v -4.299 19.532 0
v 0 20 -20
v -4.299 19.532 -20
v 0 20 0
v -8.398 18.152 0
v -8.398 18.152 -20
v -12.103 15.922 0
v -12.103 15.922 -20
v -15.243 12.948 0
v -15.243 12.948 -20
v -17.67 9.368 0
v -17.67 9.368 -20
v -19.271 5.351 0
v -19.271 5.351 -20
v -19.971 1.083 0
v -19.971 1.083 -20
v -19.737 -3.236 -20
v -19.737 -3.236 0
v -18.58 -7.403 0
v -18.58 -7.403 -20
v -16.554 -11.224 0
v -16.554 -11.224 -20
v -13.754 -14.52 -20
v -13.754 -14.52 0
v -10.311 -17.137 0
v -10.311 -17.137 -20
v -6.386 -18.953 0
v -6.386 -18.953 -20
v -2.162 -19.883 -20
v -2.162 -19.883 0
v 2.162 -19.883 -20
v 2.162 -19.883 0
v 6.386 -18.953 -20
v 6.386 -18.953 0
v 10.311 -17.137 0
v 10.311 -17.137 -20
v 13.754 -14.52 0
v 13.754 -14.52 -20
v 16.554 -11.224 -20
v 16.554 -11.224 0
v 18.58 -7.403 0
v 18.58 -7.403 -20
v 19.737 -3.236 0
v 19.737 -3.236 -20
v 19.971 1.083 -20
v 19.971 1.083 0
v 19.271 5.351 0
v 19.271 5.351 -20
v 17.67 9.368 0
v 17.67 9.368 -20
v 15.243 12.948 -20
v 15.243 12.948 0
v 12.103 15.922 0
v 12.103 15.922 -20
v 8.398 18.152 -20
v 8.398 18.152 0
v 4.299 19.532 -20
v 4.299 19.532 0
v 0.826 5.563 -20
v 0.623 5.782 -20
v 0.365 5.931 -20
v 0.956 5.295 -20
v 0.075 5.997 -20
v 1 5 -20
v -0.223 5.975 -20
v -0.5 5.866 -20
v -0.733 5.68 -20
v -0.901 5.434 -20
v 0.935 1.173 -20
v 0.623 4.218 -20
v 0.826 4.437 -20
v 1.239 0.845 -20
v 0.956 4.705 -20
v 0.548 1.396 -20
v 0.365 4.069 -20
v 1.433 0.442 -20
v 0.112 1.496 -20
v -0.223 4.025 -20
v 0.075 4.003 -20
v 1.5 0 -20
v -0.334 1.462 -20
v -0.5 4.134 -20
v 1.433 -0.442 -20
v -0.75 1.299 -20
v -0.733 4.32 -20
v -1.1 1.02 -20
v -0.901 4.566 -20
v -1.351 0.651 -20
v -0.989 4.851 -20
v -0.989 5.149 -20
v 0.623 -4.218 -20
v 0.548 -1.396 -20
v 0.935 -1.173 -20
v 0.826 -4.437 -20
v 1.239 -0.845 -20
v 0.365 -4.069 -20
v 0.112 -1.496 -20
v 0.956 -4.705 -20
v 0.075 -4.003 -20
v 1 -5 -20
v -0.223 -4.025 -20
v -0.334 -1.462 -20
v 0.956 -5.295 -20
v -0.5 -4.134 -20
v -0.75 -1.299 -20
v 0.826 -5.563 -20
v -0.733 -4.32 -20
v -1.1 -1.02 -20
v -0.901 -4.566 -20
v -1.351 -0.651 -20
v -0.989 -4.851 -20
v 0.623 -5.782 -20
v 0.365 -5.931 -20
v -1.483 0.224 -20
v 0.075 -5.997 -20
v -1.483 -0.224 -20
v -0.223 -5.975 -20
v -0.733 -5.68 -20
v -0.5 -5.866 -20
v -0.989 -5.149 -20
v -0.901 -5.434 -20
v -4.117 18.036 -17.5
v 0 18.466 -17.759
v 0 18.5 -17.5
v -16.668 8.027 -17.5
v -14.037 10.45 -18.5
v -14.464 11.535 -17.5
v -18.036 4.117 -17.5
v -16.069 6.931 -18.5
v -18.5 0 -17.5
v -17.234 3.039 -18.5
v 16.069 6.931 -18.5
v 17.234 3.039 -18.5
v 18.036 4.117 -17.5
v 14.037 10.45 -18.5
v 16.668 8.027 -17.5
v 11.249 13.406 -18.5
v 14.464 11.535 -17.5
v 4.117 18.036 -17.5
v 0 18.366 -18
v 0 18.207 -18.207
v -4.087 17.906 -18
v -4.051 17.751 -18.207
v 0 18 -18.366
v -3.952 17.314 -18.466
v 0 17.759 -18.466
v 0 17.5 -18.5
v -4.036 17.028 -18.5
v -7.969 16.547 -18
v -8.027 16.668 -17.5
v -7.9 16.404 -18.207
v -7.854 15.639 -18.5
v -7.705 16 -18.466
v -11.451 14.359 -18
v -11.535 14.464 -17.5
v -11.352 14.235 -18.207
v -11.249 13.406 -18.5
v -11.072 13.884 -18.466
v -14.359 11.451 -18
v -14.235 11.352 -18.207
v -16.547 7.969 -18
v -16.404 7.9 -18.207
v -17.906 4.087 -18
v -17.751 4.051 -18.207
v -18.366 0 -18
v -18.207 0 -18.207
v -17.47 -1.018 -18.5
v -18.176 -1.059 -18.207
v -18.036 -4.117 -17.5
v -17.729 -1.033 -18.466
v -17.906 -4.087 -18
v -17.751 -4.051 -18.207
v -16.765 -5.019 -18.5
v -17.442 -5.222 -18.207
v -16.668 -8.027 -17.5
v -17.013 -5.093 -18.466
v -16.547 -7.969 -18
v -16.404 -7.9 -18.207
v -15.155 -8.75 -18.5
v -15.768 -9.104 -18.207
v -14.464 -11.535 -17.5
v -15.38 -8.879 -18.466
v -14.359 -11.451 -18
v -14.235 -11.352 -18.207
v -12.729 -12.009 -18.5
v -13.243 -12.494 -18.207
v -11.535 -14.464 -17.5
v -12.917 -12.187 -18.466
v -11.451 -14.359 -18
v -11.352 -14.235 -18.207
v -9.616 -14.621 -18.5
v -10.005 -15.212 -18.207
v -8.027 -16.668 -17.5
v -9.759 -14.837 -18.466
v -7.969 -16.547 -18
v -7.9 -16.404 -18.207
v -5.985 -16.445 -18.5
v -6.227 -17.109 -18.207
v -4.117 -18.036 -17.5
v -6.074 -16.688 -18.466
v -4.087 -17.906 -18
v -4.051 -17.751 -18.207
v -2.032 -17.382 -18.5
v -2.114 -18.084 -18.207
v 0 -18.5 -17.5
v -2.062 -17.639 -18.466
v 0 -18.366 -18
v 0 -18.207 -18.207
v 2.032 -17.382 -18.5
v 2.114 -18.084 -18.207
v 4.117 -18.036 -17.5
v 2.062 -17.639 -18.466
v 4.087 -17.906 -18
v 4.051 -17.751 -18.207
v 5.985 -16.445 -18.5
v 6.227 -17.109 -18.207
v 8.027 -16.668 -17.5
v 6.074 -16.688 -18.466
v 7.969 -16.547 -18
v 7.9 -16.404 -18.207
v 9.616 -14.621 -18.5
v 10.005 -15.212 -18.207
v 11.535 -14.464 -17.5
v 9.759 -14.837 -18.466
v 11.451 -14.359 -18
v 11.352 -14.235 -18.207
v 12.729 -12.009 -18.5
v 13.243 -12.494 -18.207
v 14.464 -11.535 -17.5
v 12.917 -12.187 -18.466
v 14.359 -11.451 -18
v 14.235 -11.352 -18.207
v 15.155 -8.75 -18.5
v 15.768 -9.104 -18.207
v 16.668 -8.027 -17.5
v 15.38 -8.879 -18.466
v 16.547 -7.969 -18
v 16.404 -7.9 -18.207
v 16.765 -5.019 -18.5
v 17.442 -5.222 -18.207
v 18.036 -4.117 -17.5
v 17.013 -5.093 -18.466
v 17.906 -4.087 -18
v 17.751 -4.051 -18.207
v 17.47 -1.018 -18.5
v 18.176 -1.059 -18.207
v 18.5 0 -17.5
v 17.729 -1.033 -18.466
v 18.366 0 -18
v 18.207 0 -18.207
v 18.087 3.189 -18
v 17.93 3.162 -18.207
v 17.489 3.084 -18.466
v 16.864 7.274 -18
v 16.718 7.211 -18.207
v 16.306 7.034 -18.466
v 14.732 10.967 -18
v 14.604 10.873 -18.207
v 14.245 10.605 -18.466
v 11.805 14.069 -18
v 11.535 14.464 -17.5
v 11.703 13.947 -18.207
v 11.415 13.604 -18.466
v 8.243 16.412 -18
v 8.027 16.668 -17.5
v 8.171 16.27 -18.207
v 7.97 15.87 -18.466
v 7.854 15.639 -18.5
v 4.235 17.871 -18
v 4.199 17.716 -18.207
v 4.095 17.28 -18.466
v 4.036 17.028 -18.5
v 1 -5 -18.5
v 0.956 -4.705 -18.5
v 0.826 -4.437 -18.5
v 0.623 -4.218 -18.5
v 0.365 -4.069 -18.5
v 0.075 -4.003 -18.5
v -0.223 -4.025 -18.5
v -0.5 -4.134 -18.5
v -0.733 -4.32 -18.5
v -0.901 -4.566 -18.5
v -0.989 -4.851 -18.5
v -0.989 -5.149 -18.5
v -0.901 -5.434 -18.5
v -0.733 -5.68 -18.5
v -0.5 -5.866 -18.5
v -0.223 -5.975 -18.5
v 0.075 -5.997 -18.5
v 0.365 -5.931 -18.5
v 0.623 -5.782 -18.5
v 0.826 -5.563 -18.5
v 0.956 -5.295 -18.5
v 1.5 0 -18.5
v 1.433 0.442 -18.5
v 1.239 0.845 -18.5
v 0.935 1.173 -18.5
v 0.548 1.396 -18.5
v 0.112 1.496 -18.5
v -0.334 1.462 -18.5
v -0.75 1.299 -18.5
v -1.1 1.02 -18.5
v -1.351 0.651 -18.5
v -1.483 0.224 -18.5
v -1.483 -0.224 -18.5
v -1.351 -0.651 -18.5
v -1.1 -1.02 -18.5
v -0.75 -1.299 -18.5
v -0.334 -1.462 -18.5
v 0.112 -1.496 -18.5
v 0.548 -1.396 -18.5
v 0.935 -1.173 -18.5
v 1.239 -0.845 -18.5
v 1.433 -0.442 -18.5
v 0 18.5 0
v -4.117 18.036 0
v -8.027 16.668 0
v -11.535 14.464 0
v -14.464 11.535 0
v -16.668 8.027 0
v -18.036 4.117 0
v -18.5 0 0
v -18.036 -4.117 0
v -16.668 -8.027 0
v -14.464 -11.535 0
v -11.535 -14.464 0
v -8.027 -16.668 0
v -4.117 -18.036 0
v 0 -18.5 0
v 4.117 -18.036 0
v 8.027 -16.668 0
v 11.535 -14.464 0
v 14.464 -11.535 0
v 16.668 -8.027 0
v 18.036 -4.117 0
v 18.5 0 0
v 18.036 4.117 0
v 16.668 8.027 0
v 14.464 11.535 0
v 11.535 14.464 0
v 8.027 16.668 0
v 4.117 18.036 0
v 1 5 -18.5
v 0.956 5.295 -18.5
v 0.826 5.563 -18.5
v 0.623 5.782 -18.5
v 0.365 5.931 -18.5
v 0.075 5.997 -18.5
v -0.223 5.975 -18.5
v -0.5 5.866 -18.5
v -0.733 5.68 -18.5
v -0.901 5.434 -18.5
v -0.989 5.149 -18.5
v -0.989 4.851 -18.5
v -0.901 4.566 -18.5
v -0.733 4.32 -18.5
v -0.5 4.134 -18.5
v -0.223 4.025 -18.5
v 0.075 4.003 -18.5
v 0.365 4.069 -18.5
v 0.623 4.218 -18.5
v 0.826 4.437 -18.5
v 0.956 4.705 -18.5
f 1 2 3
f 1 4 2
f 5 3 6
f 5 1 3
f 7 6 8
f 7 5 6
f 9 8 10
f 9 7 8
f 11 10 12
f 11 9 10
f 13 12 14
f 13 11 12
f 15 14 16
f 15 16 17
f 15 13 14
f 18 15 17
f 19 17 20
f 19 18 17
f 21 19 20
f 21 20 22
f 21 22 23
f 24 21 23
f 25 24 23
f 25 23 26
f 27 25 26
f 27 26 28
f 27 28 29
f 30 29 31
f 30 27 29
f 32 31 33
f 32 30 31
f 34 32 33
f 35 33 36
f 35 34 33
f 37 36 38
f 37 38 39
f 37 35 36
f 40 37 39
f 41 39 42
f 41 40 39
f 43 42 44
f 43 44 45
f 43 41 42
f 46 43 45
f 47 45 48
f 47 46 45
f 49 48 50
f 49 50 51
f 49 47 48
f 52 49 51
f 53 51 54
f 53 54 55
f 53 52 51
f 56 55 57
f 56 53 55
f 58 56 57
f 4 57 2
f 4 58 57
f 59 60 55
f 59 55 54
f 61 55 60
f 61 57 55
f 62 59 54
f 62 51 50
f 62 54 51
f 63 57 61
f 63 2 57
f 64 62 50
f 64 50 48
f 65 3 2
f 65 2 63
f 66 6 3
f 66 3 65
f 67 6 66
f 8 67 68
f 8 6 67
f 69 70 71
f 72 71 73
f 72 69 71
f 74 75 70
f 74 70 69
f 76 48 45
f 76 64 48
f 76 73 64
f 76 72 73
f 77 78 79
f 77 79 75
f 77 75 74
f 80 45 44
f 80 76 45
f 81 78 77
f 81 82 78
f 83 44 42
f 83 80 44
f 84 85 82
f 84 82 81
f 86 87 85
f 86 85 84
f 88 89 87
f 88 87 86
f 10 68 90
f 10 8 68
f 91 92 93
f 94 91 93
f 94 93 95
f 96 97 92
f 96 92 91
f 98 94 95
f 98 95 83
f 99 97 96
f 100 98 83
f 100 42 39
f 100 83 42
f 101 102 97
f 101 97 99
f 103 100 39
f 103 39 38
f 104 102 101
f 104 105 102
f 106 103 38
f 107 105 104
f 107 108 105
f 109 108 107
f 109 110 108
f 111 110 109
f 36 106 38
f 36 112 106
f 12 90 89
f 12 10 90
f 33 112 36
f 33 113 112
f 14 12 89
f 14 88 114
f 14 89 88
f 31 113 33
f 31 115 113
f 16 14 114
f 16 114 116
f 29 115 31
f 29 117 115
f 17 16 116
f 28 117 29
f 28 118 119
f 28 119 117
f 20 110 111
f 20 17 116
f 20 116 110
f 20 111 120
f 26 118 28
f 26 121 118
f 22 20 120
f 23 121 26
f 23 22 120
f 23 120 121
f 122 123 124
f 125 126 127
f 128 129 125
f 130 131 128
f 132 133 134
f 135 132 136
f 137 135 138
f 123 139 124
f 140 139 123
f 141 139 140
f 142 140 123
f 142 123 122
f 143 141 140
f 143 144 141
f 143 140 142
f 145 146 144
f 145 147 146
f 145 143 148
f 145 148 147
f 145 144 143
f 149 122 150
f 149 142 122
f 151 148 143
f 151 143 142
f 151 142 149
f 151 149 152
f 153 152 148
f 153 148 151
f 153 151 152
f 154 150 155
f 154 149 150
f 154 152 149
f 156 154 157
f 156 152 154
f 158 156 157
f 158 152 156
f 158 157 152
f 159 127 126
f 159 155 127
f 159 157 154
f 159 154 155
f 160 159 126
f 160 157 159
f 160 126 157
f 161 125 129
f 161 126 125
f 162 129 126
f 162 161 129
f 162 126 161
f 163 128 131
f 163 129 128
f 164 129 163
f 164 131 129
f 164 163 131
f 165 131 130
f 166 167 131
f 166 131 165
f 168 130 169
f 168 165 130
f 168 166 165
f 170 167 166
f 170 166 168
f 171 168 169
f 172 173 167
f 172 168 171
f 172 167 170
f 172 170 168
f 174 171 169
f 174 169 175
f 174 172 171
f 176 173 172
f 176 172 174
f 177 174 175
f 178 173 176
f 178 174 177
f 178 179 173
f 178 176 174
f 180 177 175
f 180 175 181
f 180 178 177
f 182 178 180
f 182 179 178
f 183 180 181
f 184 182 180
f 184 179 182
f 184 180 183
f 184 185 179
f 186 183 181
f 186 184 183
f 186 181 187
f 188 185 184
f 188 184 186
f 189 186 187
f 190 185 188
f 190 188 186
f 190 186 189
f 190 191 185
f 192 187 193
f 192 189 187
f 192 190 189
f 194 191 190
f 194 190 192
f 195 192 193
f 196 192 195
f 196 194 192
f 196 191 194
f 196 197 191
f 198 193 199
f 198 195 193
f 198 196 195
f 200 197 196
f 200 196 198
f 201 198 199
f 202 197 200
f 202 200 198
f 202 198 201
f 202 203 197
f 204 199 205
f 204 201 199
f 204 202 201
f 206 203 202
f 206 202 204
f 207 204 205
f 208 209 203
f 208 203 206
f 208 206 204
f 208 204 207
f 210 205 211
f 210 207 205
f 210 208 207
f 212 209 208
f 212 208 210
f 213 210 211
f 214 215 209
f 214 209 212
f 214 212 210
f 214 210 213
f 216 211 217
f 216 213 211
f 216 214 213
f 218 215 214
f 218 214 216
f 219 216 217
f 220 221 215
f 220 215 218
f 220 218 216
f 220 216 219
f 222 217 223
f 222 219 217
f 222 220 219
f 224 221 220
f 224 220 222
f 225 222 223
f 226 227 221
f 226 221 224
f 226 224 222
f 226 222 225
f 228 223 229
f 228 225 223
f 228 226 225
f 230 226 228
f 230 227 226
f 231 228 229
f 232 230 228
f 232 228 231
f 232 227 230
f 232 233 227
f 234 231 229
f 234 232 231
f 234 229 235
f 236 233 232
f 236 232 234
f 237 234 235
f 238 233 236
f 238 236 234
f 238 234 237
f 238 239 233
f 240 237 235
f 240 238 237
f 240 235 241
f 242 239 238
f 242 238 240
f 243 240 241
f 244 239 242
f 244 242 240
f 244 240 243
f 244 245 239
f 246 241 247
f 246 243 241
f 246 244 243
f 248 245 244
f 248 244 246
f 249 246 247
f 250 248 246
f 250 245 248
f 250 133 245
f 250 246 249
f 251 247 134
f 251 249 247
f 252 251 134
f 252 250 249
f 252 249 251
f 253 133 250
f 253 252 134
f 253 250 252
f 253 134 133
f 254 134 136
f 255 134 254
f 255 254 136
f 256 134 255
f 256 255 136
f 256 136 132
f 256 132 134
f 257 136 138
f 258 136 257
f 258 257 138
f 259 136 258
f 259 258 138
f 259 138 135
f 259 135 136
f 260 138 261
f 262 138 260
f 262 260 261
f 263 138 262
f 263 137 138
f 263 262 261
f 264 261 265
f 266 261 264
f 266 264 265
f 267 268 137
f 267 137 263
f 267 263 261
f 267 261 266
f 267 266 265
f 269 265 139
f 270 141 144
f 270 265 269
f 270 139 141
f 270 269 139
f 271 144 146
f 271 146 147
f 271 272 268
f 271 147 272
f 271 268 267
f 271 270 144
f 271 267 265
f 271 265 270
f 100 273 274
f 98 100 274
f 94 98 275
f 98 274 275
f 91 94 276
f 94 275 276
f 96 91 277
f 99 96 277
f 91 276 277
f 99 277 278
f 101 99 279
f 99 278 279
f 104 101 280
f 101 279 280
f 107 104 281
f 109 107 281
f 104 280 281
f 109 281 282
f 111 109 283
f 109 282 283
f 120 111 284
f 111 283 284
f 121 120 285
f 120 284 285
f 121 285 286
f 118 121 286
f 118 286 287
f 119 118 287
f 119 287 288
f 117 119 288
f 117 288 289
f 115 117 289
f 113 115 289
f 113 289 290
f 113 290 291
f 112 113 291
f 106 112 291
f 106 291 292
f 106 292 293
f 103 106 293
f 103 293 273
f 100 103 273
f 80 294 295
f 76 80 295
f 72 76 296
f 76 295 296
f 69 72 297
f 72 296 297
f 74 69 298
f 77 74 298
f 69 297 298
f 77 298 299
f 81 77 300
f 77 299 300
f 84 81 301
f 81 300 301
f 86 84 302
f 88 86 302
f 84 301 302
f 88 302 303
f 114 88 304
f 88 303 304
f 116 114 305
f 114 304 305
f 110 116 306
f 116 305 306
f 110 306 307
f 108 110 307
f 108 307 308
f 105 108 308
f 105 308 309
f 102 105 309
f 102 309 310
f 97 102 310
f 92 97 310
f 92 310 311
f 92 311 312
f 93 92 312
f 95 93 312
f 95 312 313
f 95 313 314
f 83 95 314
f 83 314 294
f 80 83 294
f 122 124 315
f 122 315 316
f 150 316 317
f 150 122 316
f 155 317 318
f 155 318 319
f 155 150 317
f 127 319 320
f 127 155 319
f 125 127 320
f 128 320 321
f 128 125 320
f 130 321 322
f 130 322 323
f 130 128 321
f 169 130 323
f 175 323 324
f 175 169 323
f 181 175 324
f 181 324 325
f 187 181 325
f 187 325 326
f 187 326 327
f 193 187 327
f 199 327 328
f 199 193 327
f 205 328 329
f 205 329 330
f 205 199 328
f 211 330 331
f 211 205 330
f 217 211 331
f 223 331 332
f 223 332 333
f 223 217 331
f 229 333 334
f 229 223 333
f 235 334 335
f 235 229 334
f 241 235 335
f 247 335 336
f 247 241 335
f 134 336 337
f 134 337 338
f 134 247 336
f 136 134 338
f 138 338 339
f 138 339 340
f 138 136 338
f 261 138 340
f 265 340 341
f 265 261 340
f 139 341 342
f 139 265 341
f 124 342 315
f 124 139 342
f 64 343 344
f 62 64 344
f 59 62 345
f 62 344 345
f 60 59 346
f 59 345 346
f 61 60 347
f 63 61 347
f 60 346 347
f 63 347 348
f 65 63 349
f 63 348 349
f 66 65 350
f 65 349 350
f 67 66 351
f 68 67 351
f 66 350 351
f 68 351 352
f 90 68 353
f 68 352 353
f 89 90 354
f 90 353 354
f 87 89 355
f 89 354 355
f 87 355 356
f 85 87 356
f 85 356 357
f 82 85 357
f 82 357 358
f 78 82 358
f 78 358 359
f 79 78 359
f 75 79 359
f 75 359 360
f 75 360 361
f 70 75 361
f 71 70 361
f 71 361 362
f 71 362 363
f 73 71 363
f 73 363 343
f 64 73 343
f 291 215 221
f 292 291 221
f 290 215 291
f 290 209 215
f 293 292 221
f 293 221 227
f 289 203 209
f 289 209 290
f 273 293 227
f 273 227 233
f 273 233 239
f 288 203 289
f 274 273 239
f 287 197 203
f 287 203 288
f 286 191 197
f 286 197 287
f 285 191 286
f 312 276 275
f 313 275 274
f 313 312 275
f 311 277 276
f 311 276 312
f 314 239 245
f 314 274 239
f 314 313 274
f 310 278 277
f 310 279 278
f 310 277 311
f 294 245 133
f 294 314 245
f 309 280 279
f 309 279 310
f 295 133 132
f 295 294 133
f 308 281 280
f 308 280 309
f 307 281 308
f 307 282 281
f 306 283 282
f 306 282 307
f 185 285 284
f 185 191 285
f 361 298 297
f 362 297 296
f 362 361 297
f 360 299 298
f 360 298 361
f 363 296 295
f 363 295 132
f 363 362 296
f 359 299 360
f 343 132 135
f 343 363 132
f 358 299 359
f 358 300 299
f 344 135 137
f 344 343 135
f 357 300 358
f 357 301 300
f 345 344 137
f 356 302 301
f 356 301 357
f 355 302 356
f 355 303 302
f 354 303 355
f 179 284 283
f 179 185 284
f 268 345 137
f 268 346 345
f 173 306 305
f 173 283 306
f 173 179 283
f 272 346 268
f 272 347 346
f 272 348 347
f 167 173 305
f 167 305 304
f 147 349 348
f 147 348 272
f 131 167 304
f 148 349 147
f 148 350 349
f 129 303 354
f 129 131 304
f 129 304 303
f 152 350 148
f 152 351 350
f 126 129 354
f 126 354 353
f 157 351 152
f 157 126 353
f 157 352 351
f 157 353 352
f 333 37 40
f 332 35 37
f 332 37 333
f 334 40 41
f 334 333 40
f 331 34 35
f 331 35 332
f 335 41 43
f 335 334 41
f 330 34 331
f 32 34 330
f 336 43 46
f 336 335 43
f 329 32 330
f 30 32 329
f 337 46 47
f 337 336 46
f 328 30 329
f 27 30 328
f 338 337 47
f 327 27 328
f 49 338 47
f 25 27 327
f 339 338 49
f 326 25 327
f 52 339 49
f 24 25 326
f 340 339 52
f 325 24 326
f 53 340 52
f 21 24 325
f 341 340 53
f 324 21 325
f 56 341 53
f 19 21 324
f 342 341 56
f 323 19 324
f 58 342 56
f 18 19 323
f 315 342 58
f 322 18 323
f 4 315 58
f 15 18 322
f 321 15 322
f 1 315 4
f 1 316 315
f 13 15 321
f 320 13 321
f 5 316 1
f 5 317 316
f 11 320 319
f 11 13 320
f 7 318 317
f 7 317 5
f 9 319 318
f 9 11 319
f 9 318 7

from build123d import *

# Parameters (mm, degrees)
SKETCH1_R           = 10
SKETCH1_R_2         = 2.65
BOSS_EXTRUDE1_DEPTH = 1
SKETCH2_R           = 10
SKETCH4_R           = 20
SKETCH3_R           = 30
SKETCH5_R           = 11.5
SKETCH5_R_2         = 10
BOSS_EXTRUDE2_DEPTH = 1
SKETCH10_R          = 51.016643615
CUT_EXTRUDE2_DEPTH  = 70
FILLET1_R           = 1
SKETCH12_R          = 1
SKETCH12_R_2        = 1.5
CUT_EXTRUDE4_DEPTH  = 10


with BuildPart() as part:
    # Sketch1 → Boss-Extrude1 (new body)
    with BuildSketch(Plane.XY):
        Circle(SKETCH1_R)
        with Locations((0, 6)):
            Circle(SKETCH1_R_2, mode=Mode.SUBTRACT)
        with Locations((5.706339098, 1.854101966)):
            Circle(SKETCH1_R_2, mode=Mode.SUBTRACT)
        with Locations((3.526711514, -4.854101966)):
            Circle(SKETCH1_R_2, mode=Mode.SUBTRACT)
        with Locations((-3.526711514, -4.854101966)):
            Circle(SKETCH1_R_2, mode=Mode.SUBTRACT)
        with Locations((-5.706339098, 1.854101966)):
            Circle(SKETCH1_R_2, mode=Mode.SUBTRACT)
    extrude(amount=BOSS_EXTRUDE1_DEPTH)



with BuildPart() as body_2:
    # Sketch2 → Loft-Thin1 section 0
    with BuildSketch(Plane.XY.offset(1)):
        Circle(SKETCH2_R)
    # Sketch4 → Loft-Thin1 section 1
    with BuildSketch(Plane.XY.offset(15)):
        Circle(SKETCH4_R)
    # Sketch3 → Loft-Thin1 section 2
    with BuildSketch(Plane.XY.offset(45)):
        Circle(SKETCH3_R)
    loft()


with BuildPart() as part_1:
    add(part.part)

    add(body_2.part)  # Boss-Extrude2 merges body 2
    # Sketch5 → Boss-Extrude2 (add)
    with BuildSketch(Plane(origin=(0, 0, 0), x_dir=(-1, 0, 0), z_dir=(0, 0, -1))):
        Circle(SKETCH5_R)
        Circle(SKETCH5_R_2, mode=Mode.SUBTRACT)
    extrude(amount=-BOSS_EXTRUDE2_DEPTH)

    # Sketch10 → Cut-Extrude2 (cut)
    with BuildSketch(Plane.XY):
        Circle(SKETCH10_R)
    extrude(amount=CUT_EXTRUDE2_DEPTH, mode=Mode.SUBTRACT)


with BuildPart() as body_2_2:
    # Sketch8 → Revolve1 (revolve)
    with BuildSketch(Plane(origin=(0, 0, 0), x_dir=(0, 0, -1), z_dir=(1, 0, 0))):
        Polygon((0, 18.5), (18.5, 18.5), (18.5, 0), (20, 0), (20, 20), (0, 20), align=None)
    revolve(axis=Axis((0, 0, -20), (0, 0, 1)))

    # Fillet1
    fillet1_edges = [body_2_2.edges().sort_by_distance(p)[0] for p in [
        (0, -18.5, -18.5),
    ]]
    fillet(fillet1_edges, radius=FILLET1_R)

    # Sketch12 → Cut-Extrude4 (cut)
    with BuildSketch(Plane.XY.offset(-18.5)):
        with Locations((0, 5)):
            Circle(SKETCH12_R)
        with Locations((0, -5)):
            Circle(SKETCH12_R)
        Circle(SKETCH12_R_2)
    extrude(amount=-CUT_EXTRUDE4_DEPTH, mode=Mode.SUBTRACT)


solid = body_2_2.part
